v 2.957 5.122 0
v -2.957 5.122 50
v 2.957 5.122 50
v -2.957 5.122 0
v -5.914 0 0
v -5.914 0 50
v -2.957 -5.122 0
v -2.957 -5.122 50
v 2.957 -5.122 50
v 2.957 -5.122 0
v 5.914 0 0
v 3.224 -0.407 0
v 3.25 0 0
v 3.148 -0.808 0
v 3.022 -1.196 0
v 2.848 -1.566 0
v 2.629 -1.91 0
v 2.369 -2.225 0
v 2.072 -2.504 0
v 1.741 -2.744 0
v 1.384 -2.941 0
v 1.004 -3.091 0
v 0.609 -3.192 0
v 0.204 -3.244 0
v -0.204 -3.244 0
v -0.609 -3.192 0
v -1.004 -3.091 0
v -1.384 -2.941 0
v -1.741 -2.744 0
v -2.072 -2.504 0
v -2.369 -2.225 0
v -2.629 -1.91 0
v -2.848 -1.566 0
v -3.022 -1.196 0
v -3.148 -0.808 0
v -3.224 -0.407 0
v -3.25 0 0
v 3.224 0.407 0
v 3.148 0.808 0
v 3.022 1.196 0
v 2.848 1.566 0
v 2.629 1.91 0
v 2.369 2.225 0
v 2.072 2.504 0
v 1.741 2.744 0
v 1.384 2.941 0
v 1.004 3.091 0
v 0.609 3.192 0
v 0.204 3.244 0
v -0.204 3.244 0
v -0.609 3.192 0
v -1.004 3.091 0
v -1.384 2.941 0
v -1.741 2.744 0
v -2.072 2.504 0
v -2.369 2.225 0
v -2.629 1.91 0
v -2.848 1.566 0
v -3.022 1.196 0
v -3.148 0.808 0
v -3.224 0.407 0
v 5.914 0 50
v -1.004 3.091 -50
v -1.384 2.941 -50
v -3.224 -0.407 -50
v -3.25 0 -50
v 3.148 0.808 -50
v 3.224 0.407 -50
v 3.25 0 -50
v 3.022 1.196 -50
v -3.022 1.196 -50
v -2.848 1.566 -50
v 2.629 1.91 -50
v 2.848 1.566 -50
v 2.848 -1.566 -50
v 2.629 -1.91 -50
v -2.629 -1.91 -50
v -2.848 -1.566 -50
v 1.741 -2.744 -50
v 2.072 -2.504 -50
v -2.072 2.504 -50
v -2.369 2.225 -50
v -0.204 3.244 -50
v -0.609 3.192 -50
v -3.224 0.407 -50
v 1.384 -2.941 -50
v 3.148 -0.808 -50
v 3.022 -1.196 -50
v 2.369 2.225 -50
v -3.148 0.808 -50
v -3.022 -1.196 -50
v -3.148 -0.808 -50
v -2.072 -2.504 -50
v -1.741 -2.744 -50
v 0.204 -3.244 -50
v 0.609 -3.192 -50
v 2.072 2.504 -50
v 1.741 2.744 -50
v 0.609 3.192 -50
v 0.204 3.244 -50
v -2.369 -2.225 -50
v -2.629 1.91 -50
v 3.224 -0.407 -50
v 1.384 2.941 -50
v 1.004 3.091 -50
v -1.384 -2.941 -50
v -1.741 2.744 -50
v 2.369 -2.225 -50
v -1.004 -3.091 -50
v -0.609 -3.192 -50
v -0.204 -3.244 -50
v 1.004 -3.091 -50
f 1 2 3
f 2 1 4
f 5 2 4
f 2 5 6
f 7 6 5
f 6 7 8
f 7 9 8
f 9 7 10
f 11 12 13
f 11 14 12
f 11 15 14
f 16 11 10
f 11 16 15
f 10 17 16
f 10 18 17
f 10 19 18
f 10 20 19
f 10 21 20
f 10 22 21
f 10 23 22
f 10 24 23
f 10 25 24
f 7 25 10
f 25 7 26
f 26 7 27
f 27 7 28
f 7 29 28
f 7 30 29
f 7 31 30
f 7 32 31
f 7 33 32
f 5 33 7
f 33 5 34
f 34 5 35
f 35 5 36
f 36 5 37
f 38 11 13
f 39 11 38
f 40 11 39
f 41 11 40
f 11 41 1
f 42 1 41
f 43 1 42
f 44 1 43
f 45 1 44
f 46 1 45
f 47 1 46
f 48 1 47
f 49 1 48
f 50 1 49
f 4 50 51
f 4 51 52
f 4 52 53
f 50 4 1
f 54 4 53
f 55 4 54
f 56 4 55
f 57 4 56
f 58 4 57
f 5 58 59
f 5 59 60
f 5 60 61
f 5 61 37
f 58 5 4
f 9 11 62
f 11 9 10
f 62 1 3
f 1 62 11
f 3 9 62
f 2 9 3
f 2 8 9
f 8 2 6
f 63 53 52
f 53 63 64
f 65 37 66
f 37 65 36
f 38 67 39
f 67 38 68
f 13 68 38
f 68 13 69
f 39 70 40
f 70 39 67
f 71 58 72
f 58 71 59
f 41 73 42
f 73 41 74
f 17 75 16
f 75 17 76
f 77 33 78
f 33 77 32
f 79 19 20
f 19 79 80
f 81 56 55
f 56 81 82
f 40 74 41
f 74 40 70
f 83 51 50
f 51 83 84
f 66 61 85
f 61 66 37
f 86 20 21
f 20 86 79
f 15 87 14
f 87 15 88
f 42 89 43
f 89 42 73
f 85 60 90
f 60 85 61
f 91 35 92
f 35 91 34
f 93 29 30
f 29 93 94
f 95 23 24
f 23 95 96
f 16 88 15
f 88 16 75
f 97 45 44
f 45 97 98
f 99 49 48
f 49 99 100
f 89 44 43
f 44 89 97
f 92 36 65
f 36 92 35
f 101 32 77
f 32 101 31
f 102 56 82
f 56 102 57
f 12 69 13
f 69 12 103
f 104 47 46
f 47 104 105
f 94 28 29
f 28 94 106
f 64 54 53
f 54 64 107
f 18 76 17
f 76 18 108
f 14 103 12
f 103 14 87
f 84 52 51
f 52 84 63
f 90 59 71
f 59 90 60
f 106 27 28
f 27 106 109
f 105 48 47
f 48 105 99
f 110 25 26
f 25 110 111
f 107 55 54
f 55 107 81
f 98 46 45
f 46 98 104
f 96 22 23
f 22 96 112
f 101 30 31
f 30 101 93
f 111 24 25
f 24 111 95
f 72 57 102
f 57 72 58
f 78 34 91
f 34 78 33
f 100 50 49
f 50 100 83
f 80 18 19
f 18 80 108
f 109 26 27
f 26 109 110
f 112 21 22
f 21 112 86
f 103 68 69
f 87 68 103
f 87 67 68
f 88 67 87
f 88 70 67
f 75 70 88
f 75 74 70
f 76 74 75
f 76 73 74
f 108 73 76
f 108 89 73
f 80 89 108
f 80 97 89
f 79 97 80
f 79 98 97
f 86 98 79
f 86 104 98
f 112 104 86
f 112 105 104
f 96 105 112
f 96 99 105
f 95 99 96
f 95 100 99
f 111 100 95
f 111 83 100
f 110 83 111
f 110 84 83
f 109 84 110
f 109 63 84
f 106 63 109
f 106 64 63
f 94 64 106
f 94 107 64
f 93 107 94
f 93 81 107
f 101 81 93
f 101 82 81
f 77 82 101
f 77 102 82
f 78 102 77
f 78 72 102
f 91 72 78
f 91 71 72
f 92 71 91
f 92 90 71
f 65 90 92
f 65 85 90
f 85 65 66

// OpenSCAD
$fn = 50;


difference() {
	union() {
		linear_extrude(height = 50) {
			polygon(points = [[5.9142500000, 0.0000000000], [2.9571250000, 5.1218907443], [-2.9571250000, 5.1218907443], [-5.9142500000, 0.0000000000], [-2.9571250000, -5.1218907443], [2.9571250000, -5.1218907443]]);
		}
		translate(v = [0, 0, -50]) {
			cylinder(h = 50, r = 3.2500000000);
		}
	}
	union();
}
